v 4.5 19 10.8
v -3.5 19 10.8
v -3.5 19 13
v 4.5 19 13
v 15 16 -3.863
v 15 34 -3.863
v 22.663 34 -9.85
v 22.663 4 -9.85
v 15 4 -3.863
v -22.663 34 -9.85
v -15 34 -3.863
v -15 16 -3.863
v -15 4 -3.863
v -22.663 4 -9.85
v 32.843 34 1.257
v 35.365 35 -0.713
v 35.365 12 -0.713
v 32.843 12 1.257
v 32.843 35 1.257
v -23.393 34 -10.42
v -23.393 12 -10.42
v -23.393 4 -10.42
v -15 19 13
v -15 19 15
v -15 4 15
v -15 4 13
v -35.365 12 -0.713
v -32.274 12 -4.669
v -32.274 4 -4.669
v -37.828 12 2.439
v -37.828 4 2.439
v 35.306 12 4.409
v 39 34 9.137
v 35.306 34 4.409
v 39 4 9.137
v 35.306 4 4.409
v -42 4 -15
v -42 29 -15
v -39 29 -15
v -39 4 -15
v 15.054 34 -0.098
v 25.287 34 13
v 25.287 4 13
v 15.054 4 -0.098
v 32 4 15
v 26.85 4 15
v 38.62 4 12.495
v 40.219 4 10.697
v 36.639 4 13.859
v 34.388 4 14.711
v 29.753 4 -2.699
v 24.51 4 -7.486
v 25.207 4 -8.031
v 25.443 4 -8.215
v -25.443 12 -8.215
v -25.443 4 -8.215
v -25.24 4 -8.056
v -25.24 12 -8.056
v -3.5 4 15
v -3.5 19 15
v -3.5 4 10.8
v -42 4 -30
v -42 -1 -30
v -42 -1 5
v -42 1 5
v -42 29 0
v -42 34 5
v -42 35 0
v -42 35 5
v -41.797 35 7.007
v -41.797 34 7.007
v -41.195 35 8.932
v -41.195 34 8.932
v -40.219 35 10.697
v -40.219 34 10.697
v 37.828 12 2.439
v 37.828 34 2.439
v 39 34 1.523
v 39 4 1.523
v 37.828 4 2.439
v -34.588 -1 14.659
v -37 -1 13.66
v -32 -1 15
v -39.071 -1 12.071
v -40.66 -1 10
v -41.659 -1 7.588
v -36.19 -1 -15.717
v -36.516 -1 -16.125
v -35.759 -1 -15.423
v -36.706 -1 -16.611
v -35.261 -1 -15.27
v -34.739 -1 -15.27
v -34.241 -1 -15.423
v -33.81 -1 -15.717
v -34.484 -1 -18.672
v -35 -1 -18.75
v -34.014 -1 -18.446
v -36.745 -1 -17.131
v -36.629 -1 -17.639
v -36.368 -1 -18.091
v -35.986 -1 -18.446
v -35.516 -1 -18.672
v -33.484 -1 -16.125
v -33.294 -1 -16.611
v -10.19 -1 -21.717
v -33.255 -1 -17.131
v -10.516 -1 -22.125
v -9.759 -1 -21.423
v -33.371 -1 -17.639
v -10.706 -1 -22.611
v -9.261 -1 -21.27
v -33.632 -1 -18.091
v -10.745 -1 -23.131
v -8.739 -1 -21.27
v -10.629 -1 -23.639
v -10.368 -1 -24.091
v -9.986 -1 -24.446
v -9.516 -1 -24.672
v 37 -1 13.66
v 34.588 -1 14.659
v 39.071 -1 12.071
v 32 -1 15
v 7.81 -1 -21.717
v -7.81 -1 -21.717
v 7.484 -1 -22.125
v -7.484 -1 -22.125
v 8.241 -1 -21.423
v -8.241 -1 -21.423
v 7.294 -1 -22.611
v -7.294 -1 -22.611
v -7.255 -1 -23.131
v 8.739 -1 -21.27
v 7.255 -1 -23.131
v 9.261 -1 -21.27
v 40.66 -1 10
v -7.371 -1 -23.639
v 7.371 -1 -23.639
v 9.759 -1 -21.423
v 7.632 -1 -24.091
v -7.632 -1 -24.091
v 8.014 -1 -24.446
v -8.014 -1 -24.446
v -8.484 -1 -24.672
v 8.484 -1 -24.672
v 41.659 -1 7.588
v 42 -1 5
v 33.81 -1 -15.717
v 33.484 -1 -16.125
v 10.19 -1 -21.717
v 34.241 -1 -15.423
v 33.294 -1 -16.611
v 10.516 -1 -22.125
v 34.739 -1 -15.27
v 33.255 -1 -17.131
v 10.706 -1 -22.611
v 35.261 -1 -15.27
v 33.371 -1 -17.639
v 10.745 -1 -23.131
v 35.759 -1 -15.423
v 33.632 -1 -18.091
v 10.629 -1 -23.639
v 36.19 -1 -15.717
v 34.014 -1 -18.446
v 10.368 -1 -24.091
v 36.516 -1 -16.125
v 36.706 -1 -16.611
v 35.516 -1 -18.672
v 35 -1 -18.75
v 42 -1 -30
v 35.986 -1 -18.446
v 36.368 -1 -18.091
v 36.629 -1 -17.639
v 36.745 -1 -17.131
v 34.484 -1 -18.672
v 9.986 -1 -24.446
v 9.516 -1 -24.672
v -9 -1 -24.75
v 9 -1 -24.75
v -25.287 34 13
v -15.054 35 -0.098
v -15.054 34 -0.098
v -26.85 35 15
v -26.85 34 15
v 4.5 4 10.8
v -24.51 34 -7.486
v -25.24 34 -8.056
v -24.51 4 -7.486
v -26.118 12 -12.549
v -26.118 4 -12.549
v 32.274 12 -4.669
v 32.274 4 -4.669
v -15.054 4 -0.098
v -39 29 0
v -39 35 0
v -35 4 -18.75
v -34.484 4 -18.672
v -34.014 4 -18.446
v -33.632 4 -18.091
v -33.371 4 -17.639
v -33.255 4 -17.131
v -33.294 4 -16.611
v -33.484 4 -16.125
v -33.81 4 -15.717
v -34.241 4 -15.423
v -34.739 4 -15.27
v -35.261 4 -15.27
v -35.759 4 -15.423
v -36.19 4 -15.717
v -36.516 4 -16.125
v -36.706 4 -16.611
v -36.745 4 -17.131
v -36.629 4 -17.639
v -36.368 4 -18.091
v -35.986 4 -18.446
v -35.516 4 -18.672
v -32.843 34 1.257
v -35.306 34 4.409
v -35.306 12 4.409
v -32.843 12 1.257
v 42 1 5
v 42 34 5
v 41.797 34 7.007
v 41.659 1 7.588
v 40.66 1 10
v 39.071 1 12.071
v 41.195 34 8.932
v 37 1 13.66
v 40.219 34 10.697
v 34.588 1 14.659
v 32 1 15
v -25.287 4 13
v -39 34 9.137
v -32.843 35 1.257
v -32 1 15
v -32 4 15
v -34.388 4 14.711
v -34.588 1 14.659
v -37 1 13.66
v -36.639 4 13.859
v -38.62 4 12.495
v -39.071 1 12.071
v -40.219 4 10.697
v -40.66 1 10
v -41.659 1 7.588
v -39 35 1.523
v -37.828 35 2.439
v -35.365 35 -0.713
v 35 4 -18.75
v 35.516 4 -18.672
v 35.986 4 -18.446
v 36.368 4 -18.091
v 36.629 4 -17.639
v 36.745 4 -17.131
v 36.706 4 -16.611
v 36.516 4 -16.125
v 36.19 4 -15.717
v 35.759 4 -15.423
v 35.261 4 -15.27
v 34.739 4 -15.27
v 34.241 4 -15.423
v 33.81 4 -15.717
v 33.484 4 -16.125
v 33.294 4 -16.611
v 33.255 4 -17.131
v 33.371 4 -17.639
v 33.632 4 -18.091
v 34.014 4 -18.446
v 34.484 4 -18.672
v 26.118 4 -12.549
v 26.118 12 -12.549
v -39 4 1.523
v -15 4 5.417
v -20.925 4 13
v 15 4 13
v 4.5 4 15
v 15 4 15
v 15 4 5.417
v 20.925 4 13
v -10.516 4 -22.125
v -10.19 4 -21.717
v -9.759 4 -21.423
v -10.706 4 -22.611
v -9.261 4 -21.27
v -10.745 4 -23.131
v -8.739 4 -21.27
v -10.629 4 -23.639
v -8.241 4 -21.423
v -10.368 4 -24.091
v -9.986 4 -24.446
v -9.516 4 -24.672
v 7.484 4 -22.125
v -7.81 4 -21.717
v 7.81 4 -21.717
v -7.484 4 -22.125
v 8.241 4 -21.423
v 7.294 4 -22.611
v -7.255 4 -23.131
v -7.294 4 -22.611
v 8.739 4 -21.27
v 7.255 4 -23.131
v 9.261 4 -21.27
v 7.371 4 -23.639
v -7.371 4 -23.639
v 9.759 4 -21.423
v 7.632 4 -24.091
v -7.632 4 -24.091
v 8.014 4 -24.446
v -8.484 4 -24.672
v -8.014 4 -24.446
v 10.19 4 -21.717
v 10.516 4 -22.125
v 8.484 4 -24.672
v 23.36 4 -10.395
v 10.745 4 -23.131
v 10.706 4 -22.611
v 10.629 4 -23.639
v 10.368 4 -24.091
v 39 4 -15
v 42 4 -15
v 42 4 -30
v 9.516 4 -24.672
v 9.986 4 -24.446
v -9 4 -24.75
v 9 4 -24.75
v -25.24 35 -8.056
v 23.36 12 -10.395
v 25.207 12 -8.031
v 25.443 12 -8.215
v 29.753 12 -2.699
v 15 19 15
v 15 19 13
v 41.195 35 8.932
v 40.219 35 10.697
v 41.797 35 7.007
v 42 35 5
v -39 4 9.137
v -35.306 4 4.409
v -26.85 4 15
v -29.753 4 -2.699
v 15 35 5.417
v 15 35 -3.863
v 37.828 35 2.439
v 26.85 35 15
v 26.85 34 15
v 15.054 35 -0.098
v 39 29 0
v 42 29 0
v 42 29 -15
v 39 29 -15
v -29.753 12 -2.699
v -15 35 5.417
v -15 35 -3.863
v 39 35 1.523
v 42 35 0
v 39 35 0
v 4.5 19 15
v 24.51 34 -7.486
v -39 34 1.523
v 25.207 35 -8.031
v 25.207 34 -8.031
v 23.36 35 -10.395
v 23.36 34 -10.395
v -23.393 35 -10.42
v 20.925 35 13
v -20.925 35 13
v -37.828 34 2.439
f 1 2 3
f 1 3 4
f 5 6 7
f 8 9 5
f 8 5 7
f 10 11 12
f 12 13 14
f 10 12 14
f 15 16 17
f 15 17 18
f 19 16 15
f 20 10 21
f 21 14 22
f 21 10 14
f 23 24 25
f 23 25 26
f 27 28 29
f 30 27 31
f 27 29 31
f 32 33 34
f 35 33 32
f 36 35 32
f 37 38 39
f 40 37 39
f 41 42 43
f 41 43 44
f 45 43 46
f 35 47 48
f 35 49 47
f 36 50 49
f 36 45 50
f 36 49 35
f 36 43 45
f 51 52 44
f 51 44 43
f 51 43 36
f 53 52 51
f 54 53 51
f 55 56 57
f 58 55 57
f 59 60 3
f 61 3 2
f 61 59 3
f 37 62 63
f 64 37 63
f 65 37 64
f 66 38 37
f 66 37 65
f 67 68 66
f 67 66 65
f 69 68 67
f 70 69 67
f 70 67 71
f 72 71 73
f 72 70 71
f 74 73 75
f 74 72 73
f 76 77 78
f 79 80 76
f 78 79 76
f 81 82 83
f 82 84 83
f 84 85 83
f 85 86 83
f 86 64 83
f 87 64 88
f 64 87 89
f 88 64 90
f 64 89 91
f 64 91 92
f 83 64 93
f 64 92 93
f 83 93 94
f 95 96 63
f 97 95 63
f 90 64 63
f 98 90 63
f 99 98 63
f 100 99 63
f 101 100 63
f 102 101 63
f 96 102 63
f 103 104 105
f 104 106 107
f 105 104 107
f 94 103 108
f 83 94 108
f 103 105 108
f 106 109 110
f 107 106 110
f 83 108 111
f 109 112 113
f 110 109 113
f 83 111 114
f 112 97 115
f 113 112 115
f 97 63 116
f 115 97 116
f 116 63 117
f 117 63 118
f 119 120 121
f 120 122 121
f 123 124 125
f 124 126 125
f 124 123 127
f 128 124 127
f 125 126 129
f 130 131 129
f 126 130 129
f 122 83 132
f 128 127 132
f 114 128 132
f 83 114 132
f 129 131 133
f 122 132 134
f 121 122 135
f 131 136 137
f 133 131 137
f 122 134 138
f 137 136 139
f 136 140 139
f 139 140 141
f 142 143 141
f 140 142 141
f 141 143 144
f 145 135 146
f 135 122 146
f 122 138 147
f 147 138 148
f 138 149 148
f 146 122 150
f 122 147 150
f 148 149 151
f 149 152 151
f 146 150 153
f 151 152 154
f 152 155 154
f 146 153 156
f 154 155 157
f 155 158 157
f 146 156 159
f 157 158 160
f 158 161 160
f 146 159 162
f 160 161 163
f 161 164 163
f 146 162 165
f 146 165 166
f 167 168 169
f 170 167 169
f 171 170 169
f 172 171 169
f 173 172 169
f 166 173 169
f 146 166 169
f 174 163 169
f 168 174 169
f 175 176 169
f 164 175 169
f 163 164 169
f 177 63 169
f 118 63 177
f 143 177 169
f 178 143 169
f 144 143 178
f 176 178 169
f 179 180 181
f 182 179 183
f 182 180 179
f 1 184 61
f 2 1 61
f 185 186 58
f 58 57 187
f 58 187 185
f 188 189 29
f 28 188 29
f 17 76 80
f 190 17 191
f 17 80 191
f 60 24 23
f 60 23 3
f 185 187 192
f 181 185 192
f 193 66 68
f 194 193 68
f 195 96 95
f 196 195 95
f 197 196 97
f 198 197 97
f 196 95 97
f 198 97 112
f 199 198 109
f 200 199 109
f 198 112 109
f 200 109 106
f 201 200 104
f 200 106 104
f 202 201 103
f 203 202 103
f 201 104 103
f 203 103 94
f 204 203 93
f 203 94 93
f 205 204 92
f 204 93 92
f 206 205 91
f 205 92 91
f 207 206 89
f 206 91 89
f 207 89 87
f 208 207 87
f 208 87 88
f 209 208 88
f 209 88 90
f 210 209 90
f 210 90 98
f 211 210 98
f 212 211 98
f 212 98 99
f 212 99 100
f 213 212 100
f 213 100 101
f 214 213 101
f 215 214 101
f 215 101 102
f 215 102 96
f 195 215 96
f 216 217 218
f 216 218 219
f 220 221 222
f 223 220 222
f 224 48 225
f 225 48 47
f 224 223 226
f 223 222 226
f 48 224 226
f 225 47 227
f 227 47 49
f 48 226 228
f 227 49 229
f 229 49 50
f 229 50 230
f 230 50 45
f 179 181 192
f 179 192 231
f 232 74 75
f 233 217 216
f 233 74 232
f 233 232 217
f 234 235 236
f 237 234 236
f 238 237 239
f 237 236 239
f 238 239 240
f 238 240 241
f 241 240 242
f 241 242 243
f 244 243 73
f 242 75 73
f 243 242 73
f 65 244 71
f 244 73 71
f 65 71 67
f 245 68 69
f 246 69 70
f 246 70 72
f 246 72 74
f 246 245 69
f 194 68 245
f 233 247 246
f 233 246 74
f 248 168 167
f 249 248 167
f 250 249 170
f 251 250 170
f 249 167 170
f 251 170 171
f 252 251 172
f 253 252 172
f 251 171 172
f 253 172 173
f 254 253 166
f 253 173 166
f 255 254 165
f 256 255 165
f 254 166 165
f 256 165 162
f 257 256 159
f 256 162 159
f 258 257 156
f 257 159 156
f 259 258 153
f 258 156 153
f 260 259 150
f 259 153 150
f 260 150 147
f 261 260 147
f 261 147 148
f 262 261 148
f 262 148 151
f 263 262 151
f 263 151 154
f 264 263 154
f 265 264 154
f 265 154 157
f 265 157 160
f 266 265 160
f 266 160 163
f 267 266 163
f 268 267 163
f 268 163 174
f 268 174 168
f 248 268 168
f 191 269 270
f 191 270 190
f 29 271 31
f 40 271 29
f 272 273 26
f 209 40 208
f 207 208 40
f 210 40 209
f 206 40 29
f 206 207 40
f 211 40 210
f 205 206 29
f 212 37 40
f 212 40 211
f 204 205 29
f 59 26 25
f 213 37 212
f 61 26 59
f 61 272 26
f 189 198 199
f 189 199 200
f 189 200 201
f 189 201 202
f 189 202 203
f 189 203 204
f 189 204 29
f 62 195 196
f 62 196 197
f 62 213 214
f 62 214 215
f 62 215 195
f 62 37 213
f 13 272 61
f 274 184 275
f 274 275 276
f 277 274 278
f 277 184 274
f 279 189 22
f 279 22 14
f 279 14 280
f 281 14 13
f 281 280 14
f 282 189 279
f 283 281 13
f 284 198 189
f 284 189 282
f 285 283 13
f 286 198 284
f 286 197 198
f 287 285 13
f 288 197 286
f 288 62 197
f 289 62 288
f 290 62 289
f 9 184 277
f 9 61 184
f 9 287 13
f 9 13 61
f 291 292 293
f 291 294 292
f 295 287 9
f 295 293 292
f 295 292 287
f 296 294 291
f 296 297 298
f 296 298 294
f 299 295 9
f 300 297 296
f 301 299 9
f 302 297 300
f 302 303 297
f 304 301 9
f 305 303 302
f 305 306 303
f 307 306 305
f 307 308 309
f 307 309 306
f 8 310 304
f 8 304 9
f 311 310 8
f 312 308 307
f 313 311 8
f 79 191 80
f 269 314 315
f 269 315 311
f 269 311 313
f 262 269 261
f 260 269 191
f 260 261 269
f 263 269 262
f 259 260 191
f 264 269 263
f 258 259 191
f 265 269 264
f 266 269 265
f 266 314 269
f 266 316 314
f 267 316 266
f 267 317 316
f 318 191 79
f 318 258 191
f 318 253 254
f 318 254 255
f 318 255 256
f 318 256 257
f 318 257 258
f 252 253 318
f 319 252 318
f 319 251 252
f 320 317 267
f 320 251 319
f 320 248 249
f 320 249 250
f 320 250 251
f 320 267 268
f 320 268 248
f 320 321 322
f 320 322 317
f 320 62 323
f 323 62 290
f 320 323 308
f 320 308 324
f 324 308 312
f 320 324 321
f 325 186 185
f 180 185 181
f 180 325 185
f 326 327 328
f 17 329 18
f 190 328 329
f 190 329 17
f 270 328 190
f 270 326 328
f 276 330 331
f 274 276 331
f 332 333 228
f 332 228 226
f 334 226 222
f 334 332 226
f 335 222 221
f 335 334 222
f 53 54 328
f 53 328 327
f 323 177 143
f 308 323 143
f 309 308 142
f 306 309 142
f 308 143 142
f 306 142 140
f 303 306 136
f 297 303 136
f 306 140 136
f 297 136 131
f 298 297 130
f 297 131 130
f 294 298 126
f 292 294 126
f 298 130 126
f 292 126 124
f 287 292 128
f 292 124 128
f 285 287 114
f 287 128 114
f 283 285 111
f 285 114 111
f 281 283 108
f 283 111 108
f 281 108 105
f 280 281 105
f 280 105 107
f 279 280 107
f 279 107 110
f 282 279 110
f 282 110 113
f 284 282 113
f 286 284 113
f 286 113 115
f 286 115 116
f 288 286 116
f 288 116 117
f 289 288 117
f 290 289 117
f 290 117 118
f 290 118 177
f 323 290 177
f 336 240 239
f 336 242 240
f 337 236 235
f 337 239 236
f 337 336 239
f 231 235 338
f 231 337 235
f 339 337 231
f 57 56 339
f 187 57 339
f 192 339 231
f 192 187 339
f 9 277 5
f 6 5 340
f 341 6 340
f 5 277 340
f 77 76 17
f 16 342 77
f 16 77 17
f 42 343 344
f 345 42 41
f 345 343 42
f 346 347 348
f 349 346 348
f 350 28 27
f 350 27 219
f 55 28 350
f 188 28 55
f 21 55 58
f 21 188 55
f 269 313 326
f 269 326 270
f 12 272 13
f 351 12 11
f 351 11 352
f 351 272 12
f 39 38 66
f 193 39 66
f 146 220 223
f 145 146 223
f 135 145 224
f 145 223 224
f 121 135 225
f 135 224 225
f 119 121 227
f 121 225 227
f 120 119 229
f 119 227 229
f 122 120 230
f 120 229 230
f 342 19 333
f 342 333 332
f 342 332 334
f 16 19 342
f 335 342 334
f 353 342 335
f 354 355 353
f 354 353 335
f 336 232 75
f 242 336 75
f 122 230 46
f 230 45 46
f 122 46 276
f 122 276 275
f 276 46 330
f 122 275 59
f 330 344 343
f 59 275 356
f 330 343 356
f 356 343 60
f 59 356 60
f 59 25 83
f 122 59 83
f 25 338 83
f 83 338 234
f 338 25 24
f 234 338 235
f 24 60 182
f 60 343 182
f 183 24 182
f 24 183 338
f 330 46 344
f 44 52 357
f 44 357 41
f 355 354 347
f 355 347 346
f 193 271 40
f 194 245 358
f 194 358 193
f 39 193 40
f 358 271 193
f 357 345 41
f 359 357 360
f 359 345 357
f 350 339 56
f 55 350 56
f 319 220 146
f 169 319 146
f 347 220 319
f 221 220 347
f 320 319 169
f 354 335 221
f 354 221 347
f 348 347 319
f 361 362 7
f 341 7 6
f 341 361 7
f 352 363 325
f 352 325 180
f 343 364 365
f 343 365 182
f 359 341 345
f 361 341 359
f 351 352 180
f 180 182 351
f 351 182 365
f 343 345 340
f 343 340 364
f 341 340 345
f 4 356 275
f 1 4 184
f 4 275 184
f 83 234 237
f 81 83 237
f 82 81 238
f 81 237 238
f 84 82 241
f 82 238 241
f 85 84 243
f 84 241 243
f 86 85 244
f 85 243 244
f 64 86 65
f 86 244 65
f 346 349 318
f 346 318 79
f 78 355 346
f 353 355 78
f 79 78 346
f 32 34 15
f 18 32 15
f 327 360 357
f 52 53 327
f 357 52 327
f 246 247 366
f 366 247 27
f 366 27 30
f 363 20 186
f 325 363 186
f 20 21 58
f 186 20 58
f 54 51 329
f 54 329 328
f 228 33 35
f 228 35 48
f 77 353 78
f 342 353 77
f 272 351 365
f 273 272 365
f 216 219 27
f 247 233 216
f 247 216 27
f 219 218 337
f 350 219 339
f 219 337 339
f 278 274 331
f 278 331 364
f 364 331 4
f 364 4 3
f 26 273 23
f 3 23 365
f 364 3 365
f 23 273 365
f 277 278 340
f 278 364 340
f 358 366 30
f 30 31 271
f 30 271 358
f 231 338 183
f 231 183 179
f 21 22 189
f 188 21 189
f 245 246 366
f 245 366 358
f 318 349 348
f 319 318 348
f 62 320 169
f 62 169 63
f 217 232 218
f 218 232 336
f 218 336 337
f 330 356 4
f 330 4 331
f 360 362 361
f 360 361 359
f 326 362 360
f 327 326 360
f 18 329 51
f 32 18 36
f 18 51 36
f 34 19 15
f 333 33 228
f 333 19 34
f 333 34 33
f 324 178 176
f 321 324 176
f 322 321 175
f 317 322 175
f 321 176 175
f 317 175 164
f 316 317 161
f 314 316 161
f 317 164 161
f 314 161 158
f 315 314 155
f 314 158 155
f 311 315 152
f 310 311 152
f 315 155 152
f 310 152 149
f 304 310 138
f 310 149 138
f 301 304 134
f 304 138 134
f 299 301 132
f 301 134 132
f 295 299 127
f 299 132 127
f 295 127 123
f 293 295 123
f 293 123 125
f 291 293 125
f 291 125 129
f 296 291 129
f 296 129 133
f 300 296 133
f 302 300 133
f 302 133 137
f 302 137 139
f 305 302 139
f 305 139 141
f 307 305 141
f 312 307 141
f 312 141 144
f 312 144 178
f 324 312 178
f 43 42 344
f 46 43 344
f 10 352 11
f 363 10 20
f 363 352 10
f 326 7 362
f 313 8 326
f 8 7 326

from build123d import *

# Parameters (mm, degrees)
SKETCH_1_W           = 84
SKETCH_1_H           = 30
EXTRUDE_1_DEPTH      = 34
CUT_EXTRUDE_1_DEPTH  = 30
SKETCH_4_W           = 15
SKETCH_4_H           = 18
CUT_EXTRUDE_4_DEPTH  = 30
CUT_EXTRUDE_6_DEPTH  = 30
SKETCH_8_W           = 78
SKETCH_8_H           = 28
CUT_EXTRUDE_7_DEPTH  = 30
EXTRUDE_4_DEPTH      = 30
EXTRUDE_5_DEPTH      = 30
SKETCH_11_W          = 30
SKETCH_11_H          = 18
CUT_EXTRUDE_9_DEPTH  = 61.860496219
CUT_EXTRUDE_12_DEPTH = 30
EXTRUDE_6_DEPTH      = 30
EXTRUDE_9_DEPTH      = 8
CUT_EXTRUDE_16_DEPTH = 30
EXTRUDE_10_DEPTH     = 30
SKETCH_27_W          = 84
SKETCH_27_H          = 1
CUT_EXTRUDE_17_DEPTH = 62.806148561
SKETCH_28_W          = 26.41372768
SKETCH_28_H          = 2
CUT_EXTRUDE_18_DEPTH = 12
SKETCH_29_W          = 2
SKETCH_29_H          = 18
EXTRUDE_11_DEPTH     = 30
SKETCH_30_W          = 30
SKETCH_30_H          = 18.863254254
CUT_EXTRUDE_19_DEPTH = 12
SKETCH_31_W          = 30
SKETCH_31_H          = 3
CUT_EXTRUDE_20_DEPTH = 12
SKETCH_32_W          = 15
SKETCH_32_H          = 5
CUT_EXTRUDE_21_DEPTH = 10
SKETCH_33_W          = 15
SKETCH_33_H          = 5
CUT_EXTRUDE_22_DEPTH = 10
SKETCH_39_W          = 30
SKETCH_39_H          = 3
EXTRUDE_12_DEPTH     = 1
CHAMFER_1_SIZE       = 10
CHAMFER_1_SIZE_2     = 5.773502692
EXTRUDE_13_DEPTH     = 8
EXTRUDE_14_DEPTH     = 22
FILLET_1_R           = 10
SKETCH_44_W          = 3.5
SKETCH_44_H          = 4.2
SKETCH_44_W_2        = 4.5
EXTRUDE_16_DEPTH     = 15
EXTRUDE_START        = 1
EXTRUDE_17_DEPTH     = 1
EXTRUDE_20_DEPTH     = 2
EXTRUDE_21_DEPTH     = 5
SKETCH_52_R          = 1.75
CUT_EXTRUDE_23_DEPTH = 10


with BuildPart() as part:
    # 草图1 → 凸台-拉伸1 (new body)
    with BuildSketch(Plane(origin=(0, 0, 0), x_dir=(1, 0, 0), z_dir=(0, 1, 0))):
        Rectangle(SKETCH_1_W, SKETCH_1_H)
    extrude(amount=EXTRUDE_1_DEPTH)

    # 草图2 → 切除-拉伸1 (cut)
    with BuildSketch(Plane(origin=(0, 34, 0), x_dir=(1, 0, 0), z_dir=(0, 1, 0))):
        Polygon((-39, 15), (-3.161634299, -13), (3.161634299, -13), (39, 15), align=None)
    extrude(amount=-CUT_EXTRUDE_1_DEPTH, mode=Mode.SUBTRACT)

    # 草图4 → 切除-拉伸4 (cut)
    with BuildSketch(Plane.XY.offset(15)):
        with Locations((-7.5, 25)):
            Rectangle(SKETCH_4_W, SKETCH_4_H)
        with Locations((7.5, 25)):
            Rectangle(SKETCH_4_W, SKETCH_4_H)
    extrude(amount=-CUT_EXTRUDE_4_DEPTH, mode=Mode.SUBTRACT)

    # 草图3 → 切除-拉伸6 (cut)
    with BuildSketch(Plane(origin=(0, 34, 0), x_dir=(1, 0, 0), z_dir=(0, 1, 0))):
        Polygon((-26.356961736, 5.122175929), (-42, -14.9), (-42, -15), (-26.849909982, -15), (-16.900832692, -2.265761775), align=None)
        Polygon((42, -14.9), (26.356961736, 5.122175929), (16.900832692, -2.265761775), (26.849909982, -15), (42, -15), align=None)
    extrude(amount=-CUT_EXTRUDE_6_DEPTH, mode=Mode.SUBTRACT)

    # 草图8 → 切除-拉伸7 (cut)
    with BuildSketch(Plane(origin=(0, 34, 0), x_dir=(1, 0, 0), z_dir=(0, 1, 0))):
        with Locations((0, 1)):
            Rectangle(SKETCH_8_W, SKETCH_8_H)
    extrude(amount=-CUT_EXTRUDE_7_DEPTH, mode=Mode.SUBTRACT)

    # 草图6 → 凸台-拉伸4 (add)
    with BuildSketch(Plane(origin=(0, 4, 0), x_dir=(1, 0, 0), z_dir=(0, 1, 0))):
        Polygon((-24.50997731, 7.486208189), (-15.053848266, 0.098270486), (-13.20686384, 2.462302746), (-22.662992884, 9.85024045), align=None)
        Polygon((13.20686384, 2.462302746), (22.662992884, 9.85024045), (24.50997731, 7.486208189), (15.053848266, 0.098270486), align=None)
    extrude(amount=EXTRUDE_4_DEPTH)

    # 草图9 → 凸台-拉伸5 (add)
    with BuildSketch(Plane(origin=(0, 4, 0), x_dir=(1, 0, 0), z_dir=(0, 1, 0))):
        Polygon((13.20686384, 2.462302746), (13.20686384, -13), (24.529623979, -13), (25.287338729, -13), (15.053848266, 0.098270486), align=None)
        Polygon((-15.053848266, 0.098270486), (-25.287338729, -13), (-24.529623979, -13), (-13.20686384, -13), (-13.20686384, 2.462302746), align=None)
    extrude(amount=EXTRUDE_5_DEPTH)

    # 草图11 → 切除-拉伸9 (cut, through all)
    with BuildSketch(Plane.XY.offset(13)):
        with Locations((0, 25)):
            Rectangle(SKETCH_11_W, SKETCH_11_H)
    extrude(amount=-CUT_EXTRUDE_9_DEPTH, mode=Mode.SUBTRACT)

    # 草图14 → 切除-拉伸12 (cut)
    with BuildSketch(Plane(origin=(0, 34, 0), x_dir=(1, 0, 0), z_dir=(0, 1, 0))):
        Polygon((-15, -5.416722485), (-20.924705724, -13), (-15, -13), align=None)
        Polygon((15, -13), (20.924705724, -13), (15, -5.416722485), align=None)
    extrude(amount=-CUT_EXTRUDE_12_DEPTH, mode=Mode.SUBTRACT)

    # 草图17 → 凸台-拉伸6 (add)
    with BuildSketch(Plane(origin=(0, 4, 0), x_dir=(1, 0, 0), z_dir=(0, 1, 0))):
        Polygon((-22.662992884, 9.85024045), (-23.392760551, 10.420397439), (-25.239744977, 8.056365178), (-24.50997731, 7.486208189), align=None)
        Polygon((22.662992884, 9.85024045), (23.359699806, 10.394567554), (25.206684232, 8.030535294), (24.50997731, 7.486208189), align=None)
    extrude(amount=EXTRUDE_6_DEPTH)

    # 草图23 → 凸台-拉伸9 (add)
    with BuildSketch(Plane(origin=(0, 4, 0), x_dir=(1, 0, 0), z_dir=(0, 1, 0))):
        Polygon((23.359699806, 10.394567554), (26.117737443, 12.549382718), (32.274352197, 4.669275182), (29.752717785, 2.699158461), (25.443087458, 8.215233736), (25.206684232, 8.030535294), align=None)
        Polygon((-25.206684232, 8.030535294), (-23.359699806, 10.394567554), (-26.117737443, 12.549382718), (-32.274352197, 4.669275182), (-29.752717785, 2.699158461), (-25.443087458, 8.215233736), align=None)
    extrude(amount=EXTRUDE_9_DEPTH)

    # 草图25 → 切除-拉伸16 (cut)
    with BuildSketch(Plane(origin=(0, 34, 0), x_dir=(1, 0, 0), z_dir=(0, 1, 0))):
        Polygon((-39, -11.060175103), (-39, -9.136823031), (-42, -12.976647927), (-42, -14.9), align=None)
        Polygon((42, -12.976647927), (42, -14.9), (39, -11.060175103), (39, -9.136823031), align=None)
    extrude(amount=-CUT_EXTRUDE_16_DEPTH, mode=Mode.SUBTRACT)

    # 草图26 → 凸台-拉伸10 (add)
    with BuildSketch(Plane(origin=(0, 4, 0), x_dir=(1, 0, 0), z_dir=(0, 1, 0))):
        Polygon((-39, -9.136823031), (-35.306031148, -4.408758509), (-39, -1.52271374), align=None)
        Polygon((39, -1.52271374), (39, -9.136823031), (35.306031148, -4.408758509), align=None)
    extrude(amount=EXTRUDE_10_DEPTH)

    # 草图27 → 切除-拉伸17 (cut, through all)
    with BuildSketch(Plane(origin=(0, 0, -15), x_dir=(-1, 0, 0), z_dir=(0, 0, -1))):
        with Locations((0, 0.5)):
            Rectangle(SKETCH_27_W, SKETCH_27_H)
    extrude(amount=-CUT_EXTRUDE_17_DEPTH, mode=Mode.SUBTRACT)

    # 草图28 → 切除-拉伸18 (cut)
    with BuildSketch(Plane(origin=(0, 16, 0), x_dir=(1, 0, 0), z_dir=(0, 1, 0))):
        with Locations((0, -14)):
            Rectangle(SKETCH_28_W, SKETCH_28_H)
    extrude(amount=-CUT_EXTRUDE_18_DEPTH, mode=Mode.SUBTRACT)

    # 草图29 → 凸台-拉伸11 (add)
    with BuildSketch(Plane(origin=(-15, 0, 0), x_dir=(0, 0, -1), z_dir=(1, 0, 0))):
        with Locations((-14, 25)):
            Rectangle(SKETCH_29_W, SKETCH_29_H)
    extrude(amount=EXTRUDE_11_DEPTH)

    # 草图30 → 切除-拉伸19 (cut)
    with BuildSketch(Plane(origin=(0, 16, 0), x_dir=(1, 0, 0), z_dir=(0, 1, 0))):
        with Locations((0, -5.568372873)):
            Rectangle(SKETCH_30_W, SKETCH_30_H)
    extrude(amount=-CUT_EXTRUDE_19_DEPTH, mode=Mode.SUBTRACT)

    # 草图31 → 切除-拉伸20 (cut)
    with BuildSketch(Plane.XY.offset(15)):
        with Locations((0, 17.5)):
            Rectangle(SKETCH_31_W, SKETCH_31_H)
    extrude(amount=-CUT_EXTRUDE_20_DEPTH, mode=Mode.SUBTRACT)

    # 草图32 → 切除-拉伸21 (cut)
    with BuildSketch(Plane.ZY.offset(42)):
        with Locations((-7.5, 31.5)):
            Rectangle(SKETCH_32_W, SKETCH_32_H)
    extrude(amount=-CUT_EXTRUDE_21_DEPTH, mode=Mode.SUBTRACT)

    # 草图33 → 切除-拉伸22 (cut)
    with BuildSketch(Plane(origin=(42, 0, 0), x_dir=(0, 0, -1), z_dir=(1, 0, 0))):
        with Locations((7.5, 31.5)):
            Rectangle(SKETCH_33_W, SKETCH_33_H)
    extrude(amount=-CUT_EXTRUDE_22_DEPTH, mode=Mode.SUBTRACT)

    # 草图39 → 凸台-拉伸12 (add)
    with BuildSketch(Plane(origin=(0, 0, -15), x_dir=(-1, 0, 0), z_dir=(0, 0, -1))):
        with Locations((0, 2.5)):
            Rectangle(SKETCH_39_W, SKETCH_39_H)
    extrude(amount=EXTRUDE_12_DEPTH)

    # 倒角1
    # the kernel refuses this chamfer: 10, 5.773502692 mm, written as the material it adds along each edge
    with BuildSketch(Plane(origin=(-15, 4, -15), x_dir=(-0.9998132206222079, 0, 0.01932676561270081), z_dir=(0, -1, 0))) as chamfer_1_piece_1_section:
        Polygon((CHAMFER_1_SIZE * 0.999813220622, CHAMFER_1_SIZE * 0.0193267656127), (-CHAMFER_1_SIZE_2 * 0.0193267656124, CHAMFER_1_SIZE_2 * 0.999813220604), (0, 0), align=None)
    chamfer_1_piece_1 = extrude(amount=3, mode=Mode.PRIVATE)
    chamfer_1_piece_1 = split(chamfer_1_piece_1, bisect_by=Plane(origin=(-19.75963278, 2.5, -16), z_dir=(0, 0, 1)), keep=Keep.TOP, mode=Mode.PRIVATE)
    add(chamfer_1_piece_1)
    with BuildSketch(Plane(origin=(15, 1, -15), x_dir=(0.9998132206222079, 0, 0.01932676561270081), z_dir=(0, 1, 0))) as chamfer_1_piece_2_section:
        Polygon((CHAMFER_1_SIZE * 0.999813220622, CHAMFER_1_SIZE * 0.0193267656127), (-CHAMFER_1_SIZE_2 * 0.0193267656124, CHAMFER_1_SIZE_2 * 0.999813220604), (0, 0), align=None)
    chamfer_1_piece_2 = extrude(amount=3, mode=Mode.PRIVATE)
    chamfer_1_piece_2 = split(chamfer_1_piece_2, bisect_by=Plane(origin=(19.75963278, 2.5, -16), z_dir=(0, 0, 1)), keep=Keep.TOP, mode=Mode.PRIVATE)
    add(chamfer_1_piece_2)

    # 草图41 → 凸台-拉伸13 (add)
    with BuildSketch(Plane(origin=(0, 4, 0), x_dir=(1, 0, 0), z_dir=(0, 1, 0))):
        Polygon((-32.274352197, 4.669275182), (-37.82766556, -2.438641788), (-35.306031148, -4.408758509), (-29.752717785, 2.699158461), align=None)
        Polygon((29.752717785, 2.699158461), (35.306031148, -4.408758509), (37.82766556, -2.438641788), (32.274352197, 4.669275182), align=None)
    extrude(amount=EXTRUDE_13_DEPTH)

    # 草图42 → 凸台-拉伸14 (add)
    with BuildSketch(Plane(origin=(0, 12, 0), x_dir=(1, 0, 0), z_dir=(0, 1, 0))):
        Polygon((35.306031148, -4.408758509), (32.843385247, -1.256715495), (35.365019658, 0.713401226), (37.82766556, -2.438641788), align=None)
        Polygon((-37.82766556, -2.438641788), (-35.306031148, -4.408758509), (-32.843385247, -1.256715495), (-35.365019658, 0.713401226), align=None)
    extrude(amount=EXTRUDE_14_DEPTH)

    # 圆角1
    fillet_1_edges = [part.edges().sort_by_distance(p)[0] for p in [
        (42, 2.5, 15),
        (-42, 2.5, 15),
    ]]
    fillet(fillet_1_edges, radius=FILLET_1_R)

    # 草图44 → 凸台-拉伸16 (add)
    with BuildSketch(Plane(origin=(0, 4, 0), x_dir=(1, 0, 0), z_dir=(0, 1, 0))):
        with Locations((-1.75, -12.9)):
            Rectangle(SKETCH_44_W, SKETCH_44_H)
        with Locations((2.25, -12.9)):
            Rectangle(SKETCH_44_W_2, SKETCH_44_H)
    extrude(amount=EXTRUDE_16_DEPTH)

    # 草图47 → 凸台-拉伸17 (add)
    with BuildSketch(Plane(origin=(0, 34, 0), x_dir=(1, 0, 0), z_dir=(0, 1, 0)).offset(EXTRUDE_START)):
        with BuildLine():
            Line((32.843385247, -1.256715495), (40.218723124, -10.696717495))
            ThreePointArc((40.218723124, -10.696717495), (41.544297545, -7.984356611), (42, -5))
            Line((42, -5), (42, 0))
            Line((42, 0), (39, 0))
            Line((39, 0), (39, -1.52271374))
            Line((39, -1.52271374), (37.82766556, -2.438641788))
            Line((37.82766556, -2.438641788), (35.365019658, 0.713401226))
            Line((35.365019658, 0.713401226), (32.843385247, -1.256715495))
        make_face()
        with BuildLine():
            Line((-42, 0), (-42, -5))
            ThreePointArc((-42, -5), (-41.544297545, -7.984356611), (-40.218723124, -10.696717495))
            Line((-40.218723124, -10.696717495), (-32.843385247, -1.256715495))
            Line((-32.843385247, -1.256715495), (-35.365019658, 0.713401226))
            Line((-35.365019658, 0.713401226), (-37.82766556, -2.438641788))
            Line((-37.82766556, -2.438641788), (-39, -1.52271374))
            Line((-39, -1.52271374), (-39, 0))
            Line((-39, 0), (-42, 0))
        make_face()
        Polygon((15, -5.416722485), (20.924705724, -13), (-20.924705724, -13), (-15, -5.416722485), (-15, 3.863254254), (-23.392760551, 10.420397439), (-25.239744977, 8.056365178), (-15.053848266, 0.098270486), (-26.849909982, -15), (26.849909982, -15), (15.053848266, 0.098270486), (25.206684232, 8.030535294), (23.359699806, 10.394567554), (15, 3.863254254), align=None)
    extrude(amount=-EXTRUDE_17_DEPTH)

    # 草图50 → 凸台-拉伸20 (add)
    with BuildSketch(Plane.XZ.offset(-1)):
        with BuildLine():
            Line((-42, -15), (-25, -15))
            Line((-25, -15), (-23.267949192, -16))
            Line((-23.267949192, -16), (23.267949192, -16))
            Line((23.267949192, -16), (25, -15))
            Line((25, -15), (42, -15))
            Line((42, -15), (42, 5))
            ThreePointArc((42, 5), (39.071067812, 12.071067812), (32, 15))
            Line((32, 15), (-32, 15))
            ThreePointArc((-32, 15), (-39.071067812, 12.071067812), (-42, 5))
            Line((-42, 5), (-42, -15))
        make_face()
    extrude(amount=EXTRUDE_20_DEPTH)

    # 草图51 → 凸台-拉伸21 (add)
    with BuildSketch(Plane(origin=(0, 4, 0), x_dir=(1, 0, 0), z_dir=(0, 1, 0))):
        Polygon((-42, 15), (-25, 15), (-23.267949192, 16), (23.267949192, 16), (25, 15), (42, 15), (42, 30), (-42, 30), align=None)
    extrude(amount=-EXTRUDE_21_DEPTH)

    # 草图52 → 切除-拉伸23 (cut)
    with BuildSketch(Plane.XZ.offset(1)):
        with Locations(Location((35, -17, 0), (0, 0, 270))):
            Circle(SKETCH_52_R)
        with Locations(Location((9, -23, 0), (0, 0, 270))):
            Circle(SKETCH_52_R)
        with Locations(Location((-9, -23, 0), (0, 0, 270))):
            Circle(SKETCH_52_R)
        with Locations(Location((-35, -17, 0), (0, 0, 270))):
            Circle(SKETCH_52_R)
    extrude(amount=-CUT_EXTRUDE_23_DEPTH, mode=Mode.SUBTRACT)


solid = part.part
